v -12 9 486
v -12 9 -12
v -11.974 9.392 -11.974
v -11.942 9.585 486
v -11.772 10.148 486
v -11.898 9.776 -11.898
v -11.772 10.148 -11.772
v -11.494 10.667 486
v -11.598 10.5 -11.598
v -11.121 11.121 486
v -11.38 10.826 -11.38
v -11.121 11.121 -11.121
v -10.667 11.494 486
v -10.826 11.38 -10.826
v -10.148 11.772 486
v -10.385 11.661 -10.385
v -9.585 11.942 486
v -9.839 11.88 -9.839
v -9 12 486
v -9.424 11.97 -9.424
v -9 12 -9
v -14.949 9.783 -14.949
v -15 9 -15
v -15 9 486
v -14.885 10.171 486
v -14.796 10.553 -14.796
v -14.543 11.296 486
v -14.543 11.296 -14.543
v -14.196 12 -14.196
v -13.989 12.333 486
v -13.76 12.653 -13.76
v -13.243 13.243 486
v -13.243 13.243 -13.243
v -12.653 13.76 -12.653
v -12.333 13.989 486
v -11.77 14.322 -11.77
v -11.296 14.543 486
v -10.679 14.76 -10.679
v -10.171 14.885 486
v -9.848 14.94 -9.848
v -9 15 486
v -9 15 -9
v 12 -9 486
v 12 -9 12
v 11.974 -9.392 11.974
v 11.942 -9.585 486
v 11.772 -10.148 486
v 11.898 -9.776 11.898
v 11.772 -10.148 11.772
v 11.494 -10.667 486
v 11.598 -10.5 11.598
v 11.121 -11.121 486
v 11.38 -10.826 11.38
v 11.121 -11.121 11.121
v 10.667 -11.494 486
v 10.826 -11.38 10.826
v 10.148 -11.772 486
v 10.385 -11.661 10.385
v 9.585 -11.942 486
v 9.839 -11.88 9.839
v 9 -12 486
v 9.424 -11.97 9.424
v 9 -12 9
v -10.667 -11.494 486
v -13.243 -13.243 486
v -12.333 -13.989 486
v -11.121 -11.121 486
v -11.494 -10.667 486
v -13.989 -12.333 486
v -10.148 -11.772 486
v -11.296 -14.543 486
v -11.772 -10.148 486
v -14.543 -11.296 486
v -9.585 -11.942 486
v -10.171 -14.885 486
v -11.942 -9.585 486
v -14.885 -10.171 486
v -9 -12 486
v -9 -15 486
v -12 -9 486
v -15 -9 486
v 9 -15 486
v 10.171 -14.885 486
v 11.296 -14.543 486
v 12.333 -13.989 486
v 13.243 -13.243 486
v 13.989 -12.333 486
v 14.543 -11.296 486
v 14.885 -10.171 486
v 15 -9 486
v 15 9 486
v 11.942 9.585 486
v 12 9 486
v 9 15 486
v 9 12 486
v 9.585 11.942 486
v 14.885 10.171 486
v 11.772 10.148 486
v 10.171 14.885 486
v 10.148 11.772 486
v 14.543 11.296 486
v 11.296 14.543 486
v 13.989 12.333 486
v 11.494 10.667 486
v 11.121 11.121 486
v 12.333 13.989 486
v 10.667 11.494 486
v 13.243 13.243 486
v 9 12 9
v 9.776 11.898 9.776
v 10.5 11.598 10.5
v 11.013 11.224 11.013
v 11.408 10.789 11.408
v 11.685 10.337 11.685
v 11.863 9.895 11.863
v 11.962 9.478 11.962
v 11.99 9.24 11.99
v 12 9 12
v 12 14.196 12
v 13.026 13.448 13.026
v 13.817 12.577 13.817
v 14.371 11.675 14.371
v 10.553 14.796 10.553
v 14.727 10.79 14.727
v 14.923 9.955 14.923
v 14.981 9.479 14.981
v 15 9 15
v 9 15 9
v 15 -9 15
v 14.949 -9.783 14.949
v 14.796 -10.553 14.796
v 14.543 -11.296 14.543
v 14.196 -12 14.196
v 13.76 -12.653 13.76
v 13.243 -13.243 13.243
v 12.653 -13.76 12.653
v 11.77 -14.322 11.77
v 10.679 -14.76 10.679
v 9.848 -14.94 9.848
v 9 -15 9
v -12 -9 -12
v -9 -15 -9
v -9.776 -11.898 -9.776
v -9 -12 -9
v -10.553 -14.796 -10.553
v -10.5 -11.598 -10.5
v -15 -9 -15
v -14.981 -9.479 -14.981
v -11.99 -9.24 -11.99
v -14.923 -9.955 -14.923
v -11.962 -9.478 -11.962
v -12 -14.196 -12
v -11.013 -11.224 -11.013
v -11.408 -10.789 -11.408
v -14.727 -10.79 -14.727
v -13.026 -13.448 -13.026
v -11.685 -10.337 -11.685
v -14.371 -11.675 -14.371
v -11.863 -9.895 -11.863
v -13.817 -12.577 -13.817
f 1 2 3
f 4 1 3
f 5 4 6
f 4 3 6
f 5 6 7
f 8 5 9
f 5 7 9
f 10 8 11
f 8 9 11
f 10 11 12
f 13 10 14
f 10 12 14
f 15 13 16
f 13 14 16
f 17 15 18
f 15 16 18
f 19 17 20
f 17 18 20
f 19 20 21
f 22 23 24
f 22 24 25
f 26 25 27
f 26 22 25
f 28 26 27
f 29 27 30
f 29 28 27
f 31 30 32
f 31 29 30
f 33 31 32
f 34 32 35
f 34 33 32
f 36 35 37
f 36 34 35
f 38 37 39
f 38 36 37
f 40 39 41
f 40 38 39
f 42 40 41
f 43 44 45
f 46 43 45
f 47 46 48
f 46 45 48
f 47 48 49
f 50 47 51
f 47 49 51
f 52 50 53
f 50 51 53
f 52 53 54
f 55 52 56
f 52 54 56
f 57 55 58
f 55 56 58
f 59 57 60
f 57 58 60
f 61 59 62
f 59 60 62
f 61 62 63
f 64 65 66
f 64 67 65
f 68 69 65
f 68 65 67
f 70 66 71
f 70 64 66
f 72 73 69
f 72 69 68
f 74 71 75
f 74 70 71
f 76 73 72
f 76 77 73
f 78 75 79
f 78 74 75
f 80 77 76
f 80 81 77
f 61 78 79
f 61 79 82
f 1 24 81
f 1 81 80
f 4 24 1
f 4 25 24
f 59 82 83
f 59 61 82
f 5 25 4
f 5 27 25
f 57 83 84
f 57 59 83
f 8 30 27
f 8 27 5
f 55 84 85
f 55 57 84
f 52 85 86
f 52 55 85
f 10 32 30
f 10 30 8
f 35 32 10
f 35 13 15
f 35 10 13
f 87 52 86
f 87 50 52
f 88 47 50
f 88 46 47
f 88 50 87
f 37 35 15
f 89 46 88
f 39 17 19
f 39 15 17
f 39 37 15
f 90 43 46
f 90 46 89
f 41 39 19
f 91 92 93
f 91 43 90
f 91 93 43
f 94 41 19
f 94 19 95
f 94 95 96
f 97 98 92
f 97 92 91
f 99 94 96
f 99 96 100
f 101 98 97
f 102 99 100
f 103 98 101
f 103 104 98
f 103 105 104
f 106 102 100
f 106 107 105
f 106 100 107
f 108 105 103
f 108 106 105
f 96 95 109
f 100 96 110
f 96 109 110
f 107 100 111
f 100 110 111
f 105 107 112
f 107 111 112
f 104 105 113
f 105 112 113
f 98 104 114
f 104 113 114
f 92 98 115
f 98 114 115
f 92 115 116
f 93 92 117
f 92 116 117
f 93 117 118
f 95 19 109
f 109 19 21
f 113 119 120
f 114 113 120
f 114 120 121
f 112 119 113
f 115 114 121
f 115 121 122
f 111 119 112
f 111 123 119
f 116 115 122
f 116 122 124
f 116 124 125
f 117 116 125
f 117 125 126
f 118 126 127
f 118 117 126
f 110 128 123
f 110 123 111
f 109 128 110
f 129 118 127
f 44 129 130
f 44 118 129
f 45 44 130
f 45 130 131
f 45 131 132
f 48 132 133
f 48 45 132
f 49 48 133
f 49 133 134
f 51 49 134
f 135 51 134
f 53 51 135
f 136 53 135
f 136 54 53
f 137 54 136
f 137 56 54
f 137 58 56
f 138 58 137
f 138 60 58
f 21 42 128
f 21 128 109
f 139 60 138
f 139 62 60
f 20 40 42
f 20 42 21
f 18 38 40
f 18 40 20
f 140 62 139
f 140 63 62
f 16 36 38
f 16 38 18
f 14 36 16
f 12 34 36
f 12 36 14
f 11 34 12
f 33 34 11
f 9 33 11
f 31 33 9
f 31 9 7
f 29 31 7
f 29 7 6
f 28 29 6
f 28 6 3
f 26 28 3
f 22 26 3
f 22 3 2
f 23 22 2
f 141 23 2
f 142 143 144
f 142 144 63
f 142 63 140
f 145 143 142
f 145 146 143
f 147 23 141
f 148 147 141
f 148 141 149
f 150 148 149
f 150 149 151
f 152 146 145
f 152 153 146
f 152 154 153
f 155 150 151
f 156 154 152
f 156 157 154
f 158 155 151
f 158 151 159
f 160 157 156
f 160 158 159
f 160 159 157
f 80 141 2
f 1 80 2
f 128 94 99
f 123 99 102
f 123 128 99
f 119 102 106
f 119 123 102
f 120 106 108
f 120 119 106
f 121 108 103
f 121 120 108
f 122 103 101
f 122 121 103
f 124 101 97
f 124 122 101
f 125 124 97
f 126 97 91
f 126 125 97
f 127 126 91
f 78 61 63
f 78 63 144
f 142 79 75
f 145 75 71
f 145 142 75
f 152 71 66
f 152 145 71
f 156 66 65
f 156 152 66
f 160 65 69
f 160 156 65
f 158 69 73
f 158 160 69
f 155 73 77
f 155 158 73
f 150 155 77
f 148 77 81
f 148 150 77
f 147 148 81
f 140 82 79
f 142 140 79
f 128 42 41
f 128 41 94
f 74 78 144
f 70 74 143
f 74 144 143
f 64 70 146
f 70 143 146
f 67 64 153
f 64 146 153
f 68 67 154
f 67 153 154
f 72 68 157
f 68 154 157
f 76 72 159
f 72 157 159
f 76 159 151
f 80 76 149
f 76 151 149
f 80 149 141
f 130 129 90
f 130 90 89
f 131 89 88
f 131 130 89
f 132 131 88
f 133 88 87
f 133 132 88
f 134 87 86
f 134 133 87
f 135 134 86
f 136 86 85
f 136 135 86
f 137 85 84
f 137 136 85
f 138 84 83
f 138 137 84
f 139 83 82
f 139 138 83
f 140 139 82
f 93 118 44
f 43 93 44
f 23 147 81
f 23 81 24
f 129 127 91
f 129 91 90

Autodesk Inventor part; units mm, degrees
ref_plane "Start Plane" through (0, 0, -15) normal (0, 0, 1) x (1, 0, 0)
ref_plane "End Plane" through (0, 0, 486) normal (0, 0, 1) x (1, 0, 0)
sketch "Sketch" plane through (0, 0, 0) normal (0, 0, 1) x (1, 0, 0)
  line L0 (-15, -9) -> (-15, 9)
  line L1 (-9, 15) -> (9, 15)
  line L2 (15, 9) -> (15, -9)
  line L3 (9, -15) -> (-9, -15)
  arc A0 (-15, -9) -> (-9, -15) centre (-9, -9) ccw
  arc A1 (-9, 15) -> (-15, 9) centre (-9, 9) ccw
  arc A2 (15, 9) -> (9, 15) centre (9, 9) ccw
  arc A3 (9, -15) -> (15, -9) centre (9, -9) ccw
  arc A4 (-9, 12) -> (-12, 9) centre (-9, 9) ccw
  line L4 (-9, 12) -> (9, 12)
  arc A5 (12, 9) -> (9, 12) centre (9, 9) ccw
  line L5 (12, 9) -> (12, -9)
  arc A6 (9, -12) -> (12, -9) centre (9, -9) ccw
  line L6 (9, -12) -> (-9, -12)
  arc A7 (-12, -9) -> (-9, -12) centre (-9, -9) ccw
  line L7 (-12, -9) -> (-12, 9)
  line L8 (0, 22.7397) -> (0, -22.7397) construction
  line L9 (-22.7397, 0) -> (22.7397, 0) construction
  dimension "d7" = 6
  dimension "d10" = 30
  dimension "d11" = 30
  dimension "d12" = 3
  dimension "d15" = 15
  dimension "d16" = 15
extrude "Body" add sketch "Sketch" along normal up to surface (501 mm away) from surface at -15
sketch "Sketch3" plane through (0, 0, 0) normal (0, 0, 1) x (1, 0, 0)
  line L0 (0, 0) -> (10, 0)
ref_plane "Work Plane3" through (0, 0, 0) normal (0, -1, 0) x (1, 0, 0)
ref_plane "Work Plane4" through (-15, 0, -15) normal (0.7071, 0, -0.7071) x (-0.7071, 0, -0.7071)
split "Split1" plane through (-15, 0, -15) removes the side toward (0.7071, 0, -0.7071)
sketch "Sketch4" plane through (0, 0, 0) normal (0, -1, 0) x (1, 0, 0)
  line L0 (-2, -15) -> (12, -15) projected
  line L1 (-2, 486) -> (12, 486) projected
  dimension "d18" = 501
equation "\"d7\" = G_IR"
equation "\"d10\" = G_H"
equation "\"d11\" = G_W"
equation "\"d12\" = G_T"
equation "\"d15\" = 0.5 * d10"
equation "\"d16\" = 0.5 * d11"
equation "\"d3\" = G_L"
equation "\"G_W\" = 30"
equation "\"G_H\" = 30"
equation "\"G_T\" = 3"
equation "\"G_IR\" = 6"
equation "\"G_L\" = d18"
equation "\"G_OFFSET_START\" = 15.00001"
equation "\"G_OFFSET_END\" = 0"
equation "\"d13\" = -G_OFFSET_START"
equation "\"d14\" = G_OFFSET_END + B_L"
equation "\"B_L\" = 485.99998"
properties part number "DIN EN 10219-2 - 30 x 30 x 3  - 501" material "Steel, Mild"
